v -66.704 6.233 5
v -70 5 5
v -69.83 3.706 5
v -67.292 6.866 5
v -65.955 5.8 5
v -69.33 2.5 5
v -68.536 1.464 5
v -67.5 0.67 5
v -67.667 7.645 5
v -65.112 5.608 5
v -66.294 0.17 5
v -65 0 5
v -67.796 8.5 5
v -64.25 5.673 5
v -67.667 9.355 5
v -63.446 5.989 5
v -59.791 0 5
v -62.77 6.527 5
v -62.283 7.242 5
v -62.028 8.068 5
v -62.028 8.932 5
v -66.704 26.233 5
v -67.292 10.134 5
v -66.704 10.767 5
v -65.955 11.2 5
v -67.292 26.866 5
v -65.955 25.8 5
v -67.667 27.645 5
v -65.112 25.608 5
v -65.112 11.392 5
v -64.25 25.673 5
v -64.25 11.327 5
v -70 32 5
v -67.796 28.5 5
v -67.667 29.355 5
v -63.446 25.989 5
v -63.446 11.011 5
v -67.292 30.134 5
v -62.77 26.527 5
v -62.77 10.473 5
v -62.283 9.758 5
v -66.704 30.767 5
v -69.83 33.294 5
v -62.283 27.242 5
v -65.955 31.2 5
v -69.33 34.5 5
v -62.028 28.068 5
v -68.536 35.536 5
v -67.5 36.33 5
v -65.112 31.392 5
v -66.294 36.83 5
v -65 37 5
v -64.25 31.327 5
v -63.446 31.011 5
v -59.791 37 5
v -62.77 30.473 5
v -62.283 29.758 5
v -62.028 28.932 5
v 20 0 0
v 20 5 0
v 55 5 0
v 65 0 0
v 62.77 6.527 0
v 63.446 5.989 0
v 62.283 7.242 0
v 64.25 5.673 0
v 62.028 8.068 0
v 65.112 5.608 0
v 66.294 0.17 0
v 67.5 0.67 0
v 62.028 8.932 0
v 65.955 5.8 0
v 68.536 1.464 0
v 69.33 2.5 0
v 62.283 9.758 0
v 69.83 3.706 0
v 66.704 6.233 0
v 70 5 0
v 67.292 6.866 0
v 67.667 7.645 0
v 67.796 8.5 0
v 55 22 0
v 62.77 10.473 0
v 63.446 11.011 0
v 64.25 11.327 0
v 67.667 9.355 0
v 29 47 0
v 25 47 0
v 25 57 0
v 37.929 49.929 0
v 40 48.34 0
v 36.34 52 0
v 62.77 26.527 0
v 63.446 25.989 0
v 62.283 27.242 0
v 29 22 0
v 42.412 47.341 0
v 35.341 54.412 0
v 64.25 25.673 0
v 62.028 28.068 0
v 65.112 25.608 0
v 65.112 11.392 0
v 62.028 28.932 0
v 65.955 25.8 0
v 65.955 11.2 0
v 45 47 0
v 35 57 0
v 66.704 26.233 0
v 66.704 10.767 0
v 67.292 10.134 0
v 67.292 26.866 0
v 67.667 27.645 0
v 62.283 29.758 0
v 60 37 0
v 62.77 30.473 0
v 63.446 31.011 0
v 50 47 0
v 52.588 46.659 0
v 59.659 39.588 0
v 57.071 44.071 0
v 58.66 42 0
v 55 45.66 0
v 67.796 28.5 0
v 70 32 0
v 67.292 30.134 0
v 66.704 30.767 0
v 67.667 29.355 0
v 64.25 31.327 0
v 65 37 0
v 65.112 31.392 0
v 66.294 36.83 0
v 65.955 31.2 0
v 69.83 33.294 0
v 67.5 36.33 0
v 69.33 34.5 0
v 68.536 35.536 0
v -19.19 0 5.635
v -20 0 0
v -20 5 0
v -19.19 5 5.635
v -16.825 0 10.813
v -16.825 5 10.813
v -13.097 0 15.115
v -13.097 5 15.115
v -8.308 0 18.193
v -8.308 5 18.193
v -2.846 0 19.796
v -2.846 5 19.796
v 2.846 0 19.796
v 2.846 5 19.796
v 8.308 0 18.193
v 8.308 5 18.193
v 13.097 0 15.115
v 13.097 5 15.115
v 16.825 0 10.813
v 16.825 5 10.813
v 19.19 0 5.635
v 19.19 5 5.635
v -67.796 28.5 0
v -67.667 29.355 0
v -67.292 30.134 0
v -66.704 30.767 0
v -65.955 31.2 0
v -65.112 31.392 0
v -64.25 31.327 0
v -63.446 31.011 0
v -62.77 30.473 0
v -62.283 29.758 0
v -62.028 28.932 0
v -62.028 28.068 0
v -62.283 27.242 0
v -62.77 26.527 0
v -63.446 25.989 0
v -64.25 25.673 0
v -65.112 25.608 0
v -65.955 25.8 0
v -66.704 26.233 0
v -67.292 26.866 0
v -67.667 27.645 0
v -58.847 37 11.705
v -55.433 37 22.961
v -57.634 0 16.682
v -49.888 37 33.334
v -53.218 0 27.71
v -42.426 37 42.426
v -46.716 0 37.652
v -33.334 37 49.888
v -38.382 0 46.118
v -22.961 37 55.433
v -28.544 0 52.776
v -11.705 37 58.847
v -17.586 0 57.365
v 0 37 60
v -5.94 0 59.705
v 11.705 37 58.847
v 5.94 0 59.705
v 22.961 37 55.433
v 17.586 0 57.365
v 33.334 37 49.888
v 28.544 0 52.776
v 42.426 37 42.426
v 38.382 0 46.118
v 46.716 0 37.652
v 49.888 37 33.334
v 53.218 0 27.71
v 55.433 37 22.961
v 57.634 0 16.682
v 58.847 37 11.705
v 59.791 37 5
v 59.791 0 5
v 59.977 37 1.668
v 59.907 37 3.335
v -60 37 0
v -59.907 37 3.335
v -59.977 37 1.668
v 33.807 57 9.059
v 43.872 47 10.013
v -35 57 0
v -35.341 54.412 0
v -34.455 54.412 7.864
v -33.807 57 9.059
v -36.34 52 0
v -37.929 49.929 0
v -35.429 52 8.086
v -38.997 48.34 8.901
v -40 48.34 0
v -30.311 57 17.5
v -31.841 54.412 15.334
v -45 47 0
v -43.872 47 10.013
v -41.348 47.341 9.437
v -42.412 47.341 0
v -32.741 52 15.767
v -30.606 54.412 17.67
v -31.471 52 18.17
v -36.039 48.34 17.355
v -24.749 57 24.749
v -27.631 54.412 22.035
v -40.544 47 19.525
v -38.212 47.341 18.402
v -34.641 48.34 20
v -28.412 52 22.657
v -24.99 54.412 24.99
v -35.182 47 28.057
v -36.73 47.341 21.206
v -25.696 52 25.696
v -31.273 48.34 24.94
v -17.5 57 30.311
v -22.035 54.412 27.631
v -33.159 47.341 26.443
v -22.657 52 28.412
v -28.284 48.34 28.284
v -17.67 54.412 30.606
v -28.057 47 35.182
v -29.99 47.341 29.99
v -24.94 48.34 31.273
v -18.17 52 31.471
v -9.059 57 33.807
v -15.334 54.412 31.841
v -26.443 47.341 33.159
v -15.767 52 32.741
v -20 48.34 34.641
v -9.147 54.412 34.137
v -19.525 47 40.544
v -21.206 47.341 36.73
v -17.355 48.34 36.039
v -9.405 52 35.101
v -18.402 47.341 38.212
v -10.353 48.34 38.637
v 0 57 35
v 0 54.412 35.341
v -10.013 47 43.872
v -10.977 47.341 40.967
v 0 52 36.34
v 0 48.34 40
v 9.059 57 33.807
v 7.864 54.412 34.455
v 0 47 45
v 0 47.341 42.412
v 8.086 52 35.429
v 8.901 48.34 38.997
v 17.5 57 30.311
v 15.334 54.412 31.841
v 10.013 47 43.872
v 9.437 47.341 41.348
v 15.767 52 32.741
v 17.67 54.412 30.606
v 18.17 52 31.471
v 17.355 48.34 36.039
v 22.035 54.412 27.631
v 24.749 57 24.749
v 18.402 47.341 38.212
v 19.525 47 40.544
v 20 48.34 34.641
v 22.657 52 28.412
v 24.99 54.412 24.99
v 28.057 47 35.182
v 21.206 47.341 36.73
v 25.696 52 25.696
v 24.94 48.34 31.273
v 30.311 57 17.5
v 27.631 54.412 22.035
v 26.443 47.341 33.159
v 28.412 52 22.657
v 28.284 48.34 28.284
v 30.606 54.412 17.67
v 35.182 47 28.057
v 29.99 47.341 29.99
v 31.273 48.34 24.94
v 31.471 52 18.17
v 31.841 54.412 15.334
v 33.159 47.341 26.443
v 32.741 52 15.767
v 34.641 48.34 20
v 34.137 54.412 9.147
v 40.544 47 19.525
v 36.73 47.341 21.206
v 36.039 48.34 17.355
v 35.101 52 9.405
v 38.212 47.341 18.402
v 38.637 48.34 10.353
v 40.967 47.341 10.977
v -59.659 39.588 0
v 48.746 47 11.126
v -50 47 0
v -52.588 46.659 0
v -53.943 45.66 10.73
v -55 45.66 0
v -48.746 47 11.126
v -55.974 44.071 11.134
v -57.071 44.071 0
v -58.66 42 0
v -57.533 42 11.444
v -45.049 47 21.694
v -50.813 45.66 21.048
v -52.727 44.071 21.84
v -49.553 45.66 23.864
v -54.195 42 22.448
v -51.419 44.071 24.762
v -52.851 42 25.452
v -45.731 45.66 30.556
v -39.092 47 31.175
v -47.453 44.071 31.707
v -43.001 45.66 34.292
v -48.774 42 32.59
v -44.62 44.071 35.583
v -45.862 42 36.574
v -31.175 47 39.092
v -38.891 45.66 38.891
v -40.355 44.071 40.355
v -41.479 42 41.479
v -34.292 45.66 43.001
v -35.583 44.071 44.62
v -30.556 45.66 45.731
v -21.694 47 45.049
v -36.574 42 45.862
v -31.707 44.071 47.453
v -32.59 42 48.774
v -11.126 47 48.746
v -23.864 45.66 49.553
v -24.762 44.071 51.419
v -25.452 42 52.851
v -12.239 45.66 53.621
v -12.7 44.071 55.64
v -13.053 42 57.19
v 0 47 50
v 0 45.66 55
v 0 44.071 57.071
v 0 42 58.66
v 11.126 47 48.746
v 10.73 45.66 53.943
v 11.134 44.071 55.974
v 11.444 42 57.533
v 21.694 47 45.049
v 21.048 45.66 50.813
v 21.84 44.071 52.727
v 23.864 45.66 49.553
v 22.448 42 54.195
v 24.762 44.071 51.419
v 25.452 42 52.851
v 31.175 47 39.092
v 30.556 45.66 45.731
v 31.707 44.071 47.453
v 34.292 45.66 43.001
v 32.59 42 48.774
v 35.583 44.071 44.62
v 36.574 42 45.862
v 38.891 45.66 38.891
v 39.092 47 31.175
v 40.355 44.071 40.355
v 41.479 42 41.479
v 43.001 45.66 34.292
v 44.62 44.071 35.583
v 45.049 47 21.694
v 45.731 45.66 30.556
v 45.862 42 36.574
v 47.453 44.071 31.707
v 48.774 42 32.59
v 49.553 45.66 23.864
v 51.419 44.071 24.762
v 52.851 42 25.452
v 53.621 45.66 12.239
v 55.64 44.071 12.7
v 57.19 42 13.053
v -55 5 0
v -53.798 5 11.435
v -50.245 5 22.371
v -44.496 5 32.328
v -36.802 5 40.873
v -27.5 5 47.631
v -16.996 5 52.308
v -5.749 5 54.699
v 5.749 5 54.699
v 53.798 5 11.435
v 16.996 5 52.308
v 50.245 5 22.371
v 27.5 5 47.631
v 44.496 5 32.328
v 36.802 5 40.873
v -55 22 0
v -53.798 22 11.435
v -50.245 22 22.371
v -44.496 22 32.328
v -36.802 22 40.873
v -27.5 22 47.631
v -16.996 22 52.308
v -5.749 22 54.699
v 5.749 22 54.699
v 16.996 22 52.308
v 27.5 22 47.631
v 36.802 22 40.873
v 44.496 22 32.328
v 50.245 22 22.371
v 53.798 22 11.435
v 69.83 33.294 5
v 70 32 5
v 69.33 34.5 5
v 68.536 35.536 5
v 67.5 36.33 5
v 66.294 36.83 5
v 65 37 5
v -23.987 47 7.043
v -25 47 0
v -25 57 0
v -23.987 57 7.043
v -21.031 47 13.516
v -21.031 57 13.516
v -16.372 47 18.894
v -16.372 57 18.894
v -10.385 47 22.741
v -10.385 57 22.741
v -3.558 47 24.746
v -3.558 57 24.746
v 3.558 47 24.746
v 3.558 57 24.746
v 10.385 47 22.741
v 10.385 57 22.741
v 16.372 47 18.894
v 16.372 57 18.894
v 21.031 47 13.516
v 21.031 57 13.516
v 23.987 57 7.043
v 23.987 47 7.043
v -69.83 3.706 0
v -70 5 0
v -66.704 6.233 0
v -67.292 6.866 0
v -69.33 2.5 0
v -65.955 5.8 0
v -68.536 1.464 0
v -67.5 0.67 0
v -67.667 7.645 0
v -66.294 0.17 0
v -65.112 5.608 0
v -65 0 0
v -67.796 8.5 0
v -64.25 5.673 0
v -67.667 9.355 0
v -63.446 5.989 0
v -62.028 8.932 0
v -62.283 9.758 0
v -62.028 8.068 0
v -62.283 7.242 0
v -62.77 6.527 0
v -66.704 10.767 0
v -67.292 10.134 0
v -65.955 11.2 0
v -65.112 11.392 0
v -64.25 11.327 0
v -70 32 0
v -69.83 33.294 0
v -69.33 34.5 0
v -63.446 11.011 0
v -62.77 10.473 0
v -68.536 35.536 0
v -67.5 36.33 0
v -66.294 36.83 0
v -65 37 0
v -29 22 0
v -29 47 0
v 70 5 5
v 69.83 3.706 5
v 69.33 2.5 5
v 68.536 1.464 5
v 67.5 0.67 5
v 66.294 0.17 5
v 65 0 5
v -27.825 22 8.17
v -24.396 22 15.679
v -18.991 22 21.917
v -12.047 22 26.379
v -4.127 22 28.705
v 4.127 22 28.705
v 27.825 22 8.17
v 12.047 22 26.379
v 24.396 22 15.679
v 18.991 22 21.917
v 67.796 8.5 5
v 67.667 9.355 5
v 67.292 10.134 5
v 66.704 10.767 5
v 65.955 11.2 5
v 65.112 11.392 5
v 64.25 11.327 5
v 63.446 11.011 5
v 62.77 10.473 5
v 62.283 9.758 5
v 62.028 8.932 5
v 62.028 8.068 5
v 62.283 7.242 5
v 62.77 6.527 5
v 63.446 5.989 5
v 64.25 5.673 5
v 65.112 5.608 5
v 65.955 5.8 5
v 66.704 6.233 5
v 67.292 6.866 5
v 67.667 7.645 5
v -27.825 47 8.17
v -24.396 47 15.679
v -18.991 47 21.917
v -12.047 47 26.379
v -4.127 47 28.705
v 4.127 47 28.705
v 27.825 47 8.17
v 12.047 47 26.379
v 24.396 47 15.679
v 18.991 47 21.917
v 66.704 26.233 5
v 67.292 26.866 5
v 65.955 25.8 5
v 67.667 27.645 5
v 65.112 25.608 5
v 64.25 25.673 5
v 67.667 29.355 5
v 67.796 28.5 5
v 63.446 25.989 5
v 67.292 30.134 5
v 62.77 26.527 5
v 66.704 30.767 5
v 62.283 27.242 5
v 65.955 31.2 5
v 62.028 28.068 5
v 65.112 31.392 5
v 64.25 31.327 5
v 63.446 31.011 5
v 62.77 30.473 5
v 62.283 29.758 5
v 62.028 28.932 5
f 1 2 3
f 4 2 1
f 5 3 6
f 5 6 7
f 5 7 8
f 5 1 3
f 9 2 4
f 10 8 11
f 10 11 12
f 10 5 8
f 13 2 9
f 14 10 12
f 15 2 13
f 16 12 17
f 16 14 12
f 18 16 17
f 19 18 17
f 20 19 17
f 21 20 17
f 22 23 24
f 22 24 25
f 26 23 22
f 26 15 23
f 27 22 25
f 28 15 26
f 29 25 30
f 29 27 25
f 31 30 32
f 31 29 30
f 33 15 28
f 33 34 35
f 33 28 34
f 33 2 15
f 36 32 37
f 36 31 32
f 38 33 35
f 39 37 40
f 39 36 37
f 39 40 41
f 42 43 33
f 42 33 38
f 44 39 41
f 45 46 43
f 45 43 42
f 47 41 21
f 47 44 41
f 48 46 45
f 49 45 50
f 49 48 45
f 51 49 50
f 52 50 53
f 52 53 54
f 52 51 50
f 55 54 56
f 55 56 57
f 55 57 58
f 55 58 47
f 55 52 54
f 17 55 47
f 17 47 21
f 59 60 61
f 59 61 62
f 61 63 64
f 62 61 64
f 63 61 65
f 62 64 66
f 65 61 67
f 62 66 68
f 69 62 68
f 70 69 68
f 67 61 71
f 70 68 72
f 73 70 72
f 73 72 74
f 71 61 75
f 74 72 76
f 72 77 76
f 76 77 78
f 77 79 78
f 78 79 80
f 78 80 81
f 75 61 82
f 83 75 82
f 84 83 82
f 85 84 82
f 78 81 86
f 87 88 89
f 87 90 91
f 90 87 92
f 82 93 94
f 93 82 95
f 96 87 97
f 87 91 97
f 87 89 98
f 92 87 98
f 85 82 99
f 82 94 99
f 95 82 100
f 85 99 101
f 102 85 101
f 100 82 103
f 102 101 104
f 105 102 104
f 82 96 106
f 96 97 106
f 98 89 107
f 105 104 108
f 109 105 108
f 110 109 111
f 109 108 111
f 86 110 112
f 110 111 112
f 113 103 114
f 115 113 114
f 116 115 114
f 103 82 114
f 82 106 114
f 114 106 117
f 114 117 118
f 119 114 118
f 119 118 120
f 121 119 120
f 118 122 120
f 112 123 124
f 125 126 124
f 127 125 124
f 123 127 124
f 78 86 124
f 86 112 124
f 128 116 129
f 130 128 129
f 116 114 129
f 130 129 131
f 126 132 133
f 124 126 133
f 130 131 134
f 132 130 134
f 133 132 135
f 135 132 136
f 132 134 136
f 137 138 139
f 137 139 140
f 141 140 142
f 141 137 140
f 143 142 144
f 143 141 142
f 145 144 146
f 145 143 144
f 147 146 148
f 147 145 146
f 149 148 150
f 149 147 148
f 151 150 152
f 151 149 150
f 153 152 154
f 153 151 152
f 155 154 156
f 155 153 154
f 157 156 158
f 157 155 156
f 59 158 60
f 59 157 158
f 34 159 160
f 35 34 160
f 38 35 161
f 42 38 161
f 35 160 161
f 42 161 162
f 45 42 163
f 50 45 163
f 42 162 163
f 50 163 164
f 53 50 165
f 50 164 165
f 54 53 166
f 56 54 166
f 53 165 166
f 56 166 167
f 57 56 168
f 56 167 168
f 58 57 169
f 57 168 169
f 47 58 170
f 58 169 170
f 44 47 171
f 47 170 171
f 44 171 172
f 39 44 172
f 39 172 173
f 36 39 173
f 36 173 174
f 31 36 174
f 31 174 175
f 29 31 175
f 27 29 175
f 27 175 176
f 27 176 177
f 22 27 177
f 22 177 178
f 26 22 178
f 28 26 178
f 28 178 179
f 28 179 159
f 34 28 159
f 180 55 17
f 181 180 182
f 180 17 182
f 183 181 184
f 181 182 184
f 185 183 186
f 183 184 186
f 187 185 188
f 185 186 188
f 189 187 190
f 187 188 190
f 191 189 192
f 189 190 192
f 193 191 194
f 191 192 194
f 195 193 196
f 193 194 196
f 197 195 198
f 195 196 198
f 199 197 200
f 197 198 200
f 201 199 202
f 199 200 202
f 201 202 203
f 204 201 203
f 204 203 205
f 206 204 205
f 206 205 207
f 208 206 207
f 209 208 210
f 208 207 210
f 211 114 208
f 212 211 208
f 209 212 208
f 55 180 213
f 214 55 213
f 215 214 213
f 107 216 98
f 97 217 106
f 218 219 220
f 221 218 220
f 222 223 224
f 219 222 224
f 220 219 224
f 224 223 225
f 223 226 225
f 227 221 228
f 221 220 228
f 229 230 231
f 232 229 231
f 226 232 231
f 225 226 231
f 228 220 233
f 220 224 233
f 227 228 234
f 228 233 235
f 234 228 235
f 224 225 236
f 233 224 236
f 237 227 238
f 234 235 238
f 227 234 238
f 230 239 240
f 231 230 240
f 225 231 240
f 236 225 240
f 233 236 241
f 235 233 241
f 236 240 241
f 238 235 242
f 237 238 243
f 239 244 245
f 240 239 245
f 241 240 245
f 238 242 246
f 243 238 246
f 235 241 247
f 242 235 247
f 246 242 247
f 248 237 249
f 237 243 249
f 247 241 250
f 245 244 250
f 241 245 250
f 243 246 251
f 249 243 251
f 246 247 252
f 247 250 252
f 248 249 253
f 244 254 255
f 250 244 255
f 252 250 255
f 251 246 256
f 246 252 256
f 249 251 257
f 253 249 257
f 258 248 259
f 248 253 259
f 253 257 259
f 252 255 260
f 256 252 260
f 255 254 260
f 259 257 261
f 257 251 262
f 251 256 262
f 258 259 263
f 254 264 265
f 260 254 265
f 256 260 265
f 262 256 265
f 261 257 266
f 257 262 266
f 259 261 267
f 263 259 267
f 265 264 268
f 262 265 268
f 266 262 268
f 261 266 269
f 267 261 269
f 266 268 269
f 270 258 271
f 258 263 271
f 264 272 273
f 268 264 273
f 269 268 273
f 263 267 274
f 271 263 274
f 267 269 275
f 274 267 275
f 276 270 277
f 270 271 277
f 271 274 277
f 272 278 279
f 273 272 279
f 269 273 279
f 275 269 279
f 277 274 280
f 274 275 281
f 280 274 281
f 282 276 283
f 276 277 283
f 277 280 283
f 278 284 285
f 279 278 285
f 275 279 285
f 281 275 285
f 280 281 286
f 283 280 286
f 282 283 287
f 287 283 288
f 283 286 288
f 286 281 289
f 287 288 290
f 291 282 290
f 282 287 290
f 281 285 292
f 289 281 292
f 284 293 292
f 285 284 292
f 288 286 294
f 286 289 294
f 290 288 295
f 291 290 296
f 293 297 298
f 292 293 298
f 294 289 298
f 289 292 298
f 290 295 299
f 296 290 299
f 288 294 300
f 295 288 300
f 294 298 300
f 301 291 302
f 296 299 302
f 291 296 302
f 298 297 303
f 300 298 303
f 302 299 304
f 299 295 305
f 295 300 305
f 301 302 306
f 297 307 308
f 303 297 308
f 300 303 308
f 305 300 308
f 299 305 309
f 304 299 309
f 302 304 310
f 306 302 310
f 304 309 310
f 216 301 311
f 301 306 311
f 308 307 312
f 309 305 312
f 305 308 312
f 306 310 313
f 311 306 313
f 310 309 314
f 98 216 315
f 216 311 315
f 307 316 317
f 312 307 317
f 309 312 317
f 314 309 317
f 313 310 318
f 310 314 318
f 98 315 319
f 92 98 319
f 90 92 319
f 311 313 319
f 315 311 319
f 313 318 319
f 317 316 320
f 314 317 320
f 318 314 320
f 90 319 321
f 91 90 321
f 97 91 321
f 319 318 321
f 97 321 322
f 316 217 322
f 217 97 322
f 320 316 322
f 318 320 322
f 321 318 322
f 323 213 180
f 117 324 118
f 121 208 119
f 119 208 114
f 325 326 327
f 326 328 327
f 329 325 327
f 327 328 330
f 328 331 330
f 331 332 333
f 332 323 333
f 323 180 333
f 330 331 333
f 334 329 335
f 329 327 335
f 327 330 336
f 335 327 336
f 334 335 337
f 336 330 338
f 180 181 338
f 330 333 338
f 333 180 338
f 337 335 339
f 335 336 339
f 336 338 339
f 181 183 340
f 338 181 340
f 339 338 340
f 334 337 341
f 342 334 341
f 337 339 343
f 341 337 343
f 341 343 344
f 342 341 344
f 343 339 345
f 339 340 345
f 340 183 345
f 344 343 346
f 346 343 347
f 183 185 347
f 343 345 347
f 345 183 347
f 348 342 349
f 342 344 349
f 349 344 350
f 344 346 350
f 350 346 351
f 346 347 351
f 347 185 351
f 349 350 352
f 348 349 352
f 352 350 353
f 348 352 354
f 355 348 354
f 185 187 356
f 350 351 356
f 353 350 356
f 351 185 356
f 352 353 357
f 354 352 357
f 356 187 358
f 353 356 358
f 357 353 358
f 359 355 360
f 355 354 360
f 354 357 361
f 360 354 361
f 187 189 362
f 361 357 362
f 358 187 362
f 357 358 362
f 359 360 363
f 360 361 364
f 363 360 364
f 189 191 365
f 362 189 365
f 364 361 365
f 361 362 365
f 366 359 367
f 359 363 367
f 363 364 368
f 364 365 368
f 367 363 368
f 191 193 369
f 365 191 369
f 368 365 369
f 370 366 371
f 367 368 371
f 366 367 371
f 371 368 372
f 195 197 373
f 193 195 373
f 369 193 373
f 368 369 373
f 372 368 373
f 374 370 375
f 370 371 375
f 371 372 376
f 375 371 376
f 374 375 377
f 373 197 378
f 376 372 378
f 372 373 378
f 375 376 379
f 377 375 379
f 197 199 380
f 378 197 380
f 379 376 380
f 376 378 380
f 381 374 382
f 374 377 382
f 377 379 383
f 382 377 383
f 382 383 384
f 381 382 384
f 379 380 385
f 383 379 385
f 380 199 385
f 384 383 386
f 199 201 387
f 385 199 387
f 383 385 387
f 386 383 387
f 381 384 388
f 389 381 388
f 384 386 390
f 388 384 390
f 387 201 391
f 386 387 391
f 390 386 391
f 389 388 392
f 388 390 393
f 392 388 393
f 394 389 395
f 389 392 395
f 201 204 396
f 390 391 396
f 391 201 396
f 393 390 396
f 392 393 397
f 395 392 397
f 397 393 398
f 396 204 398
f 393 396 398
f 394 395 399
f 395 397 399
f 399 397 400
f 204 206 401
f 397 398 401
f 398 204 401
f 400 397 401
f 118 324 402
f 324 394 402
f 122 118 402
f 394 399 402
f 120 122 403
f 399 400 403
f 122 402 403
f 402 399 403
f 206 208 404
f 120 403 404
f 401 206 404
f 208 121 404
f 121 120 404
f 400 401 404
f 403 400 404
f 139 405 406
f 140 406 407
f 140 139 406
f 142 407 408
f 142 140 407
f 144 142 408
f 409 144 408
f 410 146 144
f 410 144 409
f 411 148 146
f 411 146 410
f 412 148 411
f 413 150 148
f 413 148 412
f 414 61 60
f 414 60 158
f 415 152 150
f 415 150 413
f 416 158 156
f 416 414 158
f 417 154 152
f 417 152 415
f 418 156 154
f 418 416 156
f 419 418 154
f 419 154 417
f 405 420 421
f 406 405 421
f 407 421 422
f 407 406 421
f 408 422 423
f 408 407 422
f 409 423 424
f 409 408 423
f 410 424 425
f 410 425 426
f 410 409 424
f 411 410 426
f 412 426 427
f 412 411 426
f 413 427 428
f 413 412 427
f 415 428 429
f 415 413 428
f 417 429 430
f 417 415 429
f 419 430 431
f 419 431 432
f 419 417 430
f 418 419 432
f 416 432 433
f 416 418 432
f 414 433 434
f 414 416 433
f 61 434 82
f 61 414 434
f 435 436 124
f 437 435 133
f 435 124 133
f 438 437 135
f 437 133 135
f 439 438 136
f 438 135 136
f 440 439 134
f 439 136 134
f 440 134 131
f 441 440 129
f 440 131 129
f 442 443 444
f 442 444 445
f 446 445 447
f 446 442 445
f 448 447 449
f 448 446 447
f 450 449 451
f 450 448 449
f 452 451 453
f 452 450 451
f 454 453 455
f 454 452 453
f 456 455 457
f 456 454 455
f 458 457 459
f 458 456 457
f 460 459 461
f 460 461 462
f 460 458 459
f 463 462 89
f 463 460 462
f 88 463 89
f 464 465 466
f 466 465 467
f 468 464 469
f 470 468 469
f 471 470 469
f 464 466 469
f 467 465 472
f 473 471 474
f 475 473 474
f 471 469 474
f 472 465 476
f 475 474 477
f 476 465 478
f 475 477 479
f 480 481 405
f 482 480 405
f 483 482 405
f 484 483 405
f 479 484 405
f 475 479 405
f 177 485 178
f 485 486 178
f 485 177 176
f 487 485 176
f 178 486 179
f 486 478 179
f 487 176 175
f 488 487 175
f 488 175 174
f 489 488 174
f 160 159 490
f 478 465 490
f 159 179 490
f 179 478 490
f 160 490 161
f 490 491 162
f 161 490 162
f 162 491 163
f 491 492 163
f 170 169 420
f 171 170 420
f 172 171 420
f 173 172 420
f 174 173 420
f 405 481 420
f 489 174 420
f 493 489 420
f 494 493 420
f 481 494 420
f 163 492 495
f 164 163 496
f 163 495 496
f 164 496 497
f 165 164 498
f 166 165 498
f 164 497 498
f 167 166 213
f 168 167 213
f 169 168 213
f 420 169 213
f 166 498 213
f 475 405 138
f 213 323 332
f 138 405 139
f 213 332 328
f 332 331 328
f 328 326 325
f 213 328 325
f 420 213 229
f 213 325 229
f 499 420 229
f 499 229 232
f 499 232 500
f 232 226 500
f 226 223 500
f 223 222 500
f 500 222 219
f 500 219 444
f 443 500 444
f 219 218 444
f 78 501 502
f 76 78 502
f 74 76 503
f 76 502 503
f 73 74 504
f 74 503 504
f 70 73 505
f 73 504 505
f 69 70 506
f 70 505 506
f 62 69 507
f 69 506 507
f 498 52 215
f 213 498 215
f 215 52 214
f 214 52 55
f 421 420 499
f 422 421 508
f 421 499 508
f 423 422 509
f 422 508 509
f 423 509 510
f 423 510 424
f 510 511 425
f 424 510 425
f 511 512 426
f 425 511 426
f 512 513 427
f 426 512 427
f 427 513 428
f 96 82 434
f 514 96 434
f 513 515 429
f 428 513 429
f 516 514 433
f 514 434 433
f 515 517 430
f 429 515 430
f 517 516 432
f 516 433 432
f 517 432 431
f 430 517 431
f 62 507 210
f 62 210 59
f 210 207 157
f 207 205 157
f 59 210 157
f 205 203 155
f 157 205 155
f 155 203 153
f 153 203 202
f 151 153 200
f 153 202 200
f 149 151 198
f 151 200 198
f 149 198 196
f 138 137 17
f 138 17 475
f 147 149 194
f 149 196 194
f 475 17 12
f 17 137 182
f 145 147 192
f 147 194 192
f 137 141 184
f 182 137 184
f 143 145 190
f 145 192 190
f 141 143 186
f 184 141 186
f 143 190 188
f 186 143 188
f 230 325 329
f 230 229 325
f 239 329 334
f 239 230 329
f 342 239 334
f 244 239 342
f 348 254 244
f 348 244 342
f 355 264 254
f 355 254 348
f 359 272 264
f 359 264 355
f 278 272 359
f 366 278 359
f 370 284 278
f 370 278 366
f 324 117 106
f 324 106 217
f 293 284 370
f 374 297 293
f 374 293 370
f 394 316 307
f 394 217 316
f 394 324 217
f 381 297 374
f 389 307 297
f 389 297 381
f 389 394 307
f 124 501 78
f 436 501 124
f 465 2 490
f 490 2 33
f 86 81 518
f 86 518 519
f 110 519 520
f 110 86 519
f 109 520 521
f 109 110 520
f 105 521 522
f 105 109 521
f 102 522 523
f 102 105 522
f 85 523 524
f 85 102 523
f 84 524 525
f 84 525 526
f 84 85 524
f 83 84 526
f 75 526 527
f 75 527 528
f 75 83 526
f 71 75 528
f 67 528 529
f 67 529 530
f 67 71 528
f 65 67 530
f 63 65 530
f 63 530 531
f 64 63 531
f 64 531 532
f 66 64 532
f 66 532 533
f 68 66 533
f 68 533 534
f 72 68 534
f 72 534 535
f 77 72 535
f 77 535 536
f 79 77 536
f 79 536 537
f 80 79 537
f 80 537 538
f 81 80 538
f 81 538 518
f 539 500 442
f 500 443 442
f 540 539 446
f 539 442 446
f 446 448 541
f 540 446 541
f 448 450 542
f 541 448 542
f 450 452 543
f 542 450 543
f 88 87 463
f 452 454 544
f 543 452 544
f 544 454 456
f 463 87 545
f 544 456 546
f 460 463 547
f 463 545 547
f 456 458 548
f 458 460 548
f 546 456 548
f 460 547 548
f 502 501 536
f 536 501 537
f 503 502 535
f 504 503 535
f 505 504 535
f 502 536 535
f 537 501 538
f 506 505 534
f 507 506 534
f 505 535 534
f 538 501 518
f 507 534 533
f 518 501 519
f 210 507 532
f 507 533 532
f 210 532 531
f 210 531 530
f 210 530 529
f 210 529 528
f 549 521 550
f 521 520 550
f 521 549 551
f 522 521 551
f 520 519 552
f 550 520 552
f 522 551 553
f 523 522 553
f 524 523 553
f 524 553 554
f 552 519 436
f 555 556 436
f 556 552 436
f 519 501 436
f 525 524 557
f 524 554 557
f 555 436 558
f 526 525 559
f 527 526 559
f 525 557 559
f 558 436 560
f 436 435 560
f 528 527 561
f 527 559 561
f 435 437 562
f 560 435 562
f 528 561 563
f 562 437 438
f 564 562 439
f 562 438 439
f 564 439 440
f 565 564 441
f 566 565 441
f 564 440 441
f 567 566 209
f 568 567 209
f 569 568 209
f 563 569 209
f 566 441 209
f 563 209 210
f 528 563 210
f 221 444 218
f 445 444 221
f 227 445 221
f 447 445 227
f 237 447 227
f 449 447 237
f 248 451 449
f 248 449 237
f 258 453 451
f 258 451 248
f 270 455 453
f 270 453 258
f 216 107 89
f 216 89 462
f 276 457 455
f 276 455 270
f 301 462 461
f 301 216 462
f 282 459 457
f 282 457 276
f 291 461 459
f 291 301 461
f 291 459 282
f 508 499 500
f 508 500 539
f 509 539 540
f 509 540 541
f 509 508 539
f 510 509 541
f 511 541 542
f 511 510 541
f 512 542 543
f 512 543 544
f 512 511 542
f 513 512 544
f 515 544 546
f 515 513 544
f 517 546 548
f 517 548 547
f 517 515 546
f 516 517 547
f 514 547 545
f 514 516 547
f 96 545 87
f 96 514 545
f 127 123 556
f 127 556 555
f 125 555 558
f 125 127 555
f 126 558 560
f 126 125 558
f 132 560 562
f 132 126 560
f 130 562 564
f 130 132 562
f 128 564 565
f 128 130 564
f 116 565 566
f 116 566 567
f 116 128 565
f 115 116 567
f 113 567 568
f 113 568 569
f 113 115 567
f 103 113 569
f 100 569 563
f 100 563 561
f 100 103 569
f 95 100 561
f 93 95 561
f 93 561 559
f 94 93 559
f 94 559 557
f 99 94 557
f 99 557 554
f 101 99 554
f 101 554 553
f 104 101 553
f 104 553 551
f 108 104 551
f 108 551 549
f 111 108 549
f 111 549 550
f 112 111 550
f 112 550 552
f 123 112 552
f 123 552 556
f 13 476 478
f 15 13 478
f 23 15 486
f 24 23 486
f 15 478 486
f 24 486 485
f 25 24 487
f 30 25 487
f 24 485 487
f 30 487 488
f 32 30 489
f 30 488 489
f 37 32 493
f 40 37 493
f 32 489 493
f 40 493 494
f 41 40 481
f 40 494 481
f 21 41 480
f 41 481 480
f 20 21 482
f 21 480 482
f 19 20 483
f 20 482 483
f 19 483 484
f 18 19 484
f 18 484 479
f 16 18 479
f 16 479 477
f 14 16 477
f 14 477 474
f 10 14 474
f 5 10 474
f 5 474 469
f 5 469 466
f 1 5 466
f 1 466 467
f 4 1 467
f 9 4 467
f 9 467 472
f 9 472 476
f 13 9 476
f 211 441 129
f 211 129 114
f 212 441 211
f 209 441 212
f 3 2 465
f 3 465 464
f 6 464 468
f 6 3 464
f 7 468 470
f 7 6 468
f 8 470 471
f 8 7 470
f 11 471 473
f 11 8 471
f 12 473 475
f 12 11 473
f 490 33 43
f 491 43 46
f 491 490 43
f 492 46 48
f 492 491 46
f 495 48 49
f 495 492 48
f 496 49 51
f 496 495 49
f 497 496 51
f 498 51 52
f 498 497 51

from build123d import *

# Parameters (mm, degrees)
SKETCH1_R                = 25
SKETCH1_R_2              = 20
BOSS_EXTRUDE1_DEPTH      = 5
BOSS_EXTRUDE2_START      = -5
SKETCH2_R                = 60
SKETCH2_R_2              = 20
BOSS_EXTRUDE2_DEPTH      = 5
SKETCH3_R                = 60
SKETCH3_R_2              = 55
BOSS_EXTRUDE3_DEPTH      = 17
SKETCH4_R                = 60
SKETCH4_R_2              = 29
BOSS_EXTRUDE4_DEPTH      = 25
SKETCH5_R                = 35
SKETCH5_R_2              = 25
BOSS_EXTRUDE5_DEPTH      = 10
FILLET2_R                = 10
SKETCH6_W                = 10
SKETCH6_H                = 37
BOSS_EXTRUDE7_DEPTH      = 5
BOSS_EXTRUDE8_REACH      = 156.107
BOSS_EXTRUDE8_END_RADIUS = 60
SKETCH7_W                = 10
SKETCH7_H                = 37
M5_CLEARANCE_HOLE1_D     = 5.8
FILLET3_R                = 5


with BuildPart() as part:
    # Sketch1 → Boss-Extrude1 (new body)
    with BuildSketch(Plane(origin=(0, 0, 0), x_dir=(1, 0, 0), z_dir=(0, 1, 0))):
        with Locations(Location((0, 0, 0), (0, 0, 270))):
            Circle(SKETCH1_R)
        with Locations(Location((0, 0, 0), (0, 0, 270))):
            Circle(SKETCH1_R_2, mode=Mode.SUBTRACT)
    extrude(amount=BOSS_EXTRUDE1_DEPTH)

    # Sketch2 → Boss-Extrude2 (add)
    with BuildSketch(Plane(origin=(0, 5, 0), x_dir=(1, 0, 0), z_dir=(0, 1, 0)).offset(BOSS_EXTRUDE2_START)):
        with Locations(Location((0, 0, 0), (0, 0, 270))):
            Circle(SKETCH2_R)
        with Locations(Location((0, 0, 0), (0, 0, 270))):
            Circle(SKETCH2_R_2, mode=Mode.SUBTRACT)
    extrude(amount=BOSS_EXTRUDE2_DEPTH)

    # Sketch3 → Boss-Extrude3 (add)
    with BuildSketch(Plane(origin=(0, 5, 0), x_dir=(1, 0, 0), z_dir=(0, 1, 0))):
        with Locations(Location((0, 0, 0), (0, 0, 270))):
            Circle(SKETCH3_R)
        with Locations(Location((0, 0, 0), (0, 0, 270))):
            Circle(SKETCH3_R_2, mode=Mode.SUBTRACT)
    extrude(amount=BOSS_EXTRUDE3_DEPTH)

    # Sketch4 → Boss-Extrude4 (add)
    with BuildSketch(Plane(origin=(0, 22, 0), x_dir=(1, 0, 0), z_dir=(0, 1, 0))):
        with Locations(Location((0, 0, 0), (0, 0, 270))):
            Circle(SKETCH4_R)
        with Locations(Location((0, 0, 0), (0, 0, 270))):
            Circle(SKETCH4_R_2, mode=Mode.SUBTRACT)
    extrude(amount=BOSS_EXTRUDE4_DEPTH)

    # Sketch5 → Boss-Extrude5 (add)
    with BuildSketch(Plane(origin=(0, 47, 0), x_dir=(1, 0, 0), z_dir=(0, 1, 0))):
        with Locations(Location((0, 0, 0), (0, 0, 270))):
            Circle(SKETCH5_R)
        with Locations(Location((0, 0, 0), (0, 0, 270))):
            Circle(SKETCH5_R_2, mode=Mode.SUBTRACT)
    extrude(amount=BOSS_EXTRUDE5_DEPTH)

    # Fillet2
    fillet2_edges = [part.edges().sort_by_distance(p)[0] for p in [
        (0, 47, -60),
        (0, 47, -35),
    ]]
    fillet(fillet2_edges, radius=FILLET2_R - 0.0001)  # a hair under: the kernel refuses the full size



with BuildPart() as body_2:
    # Sketch6 → Boss-Extrude7 (new, symmetric)
    with BuildSketch(Plane.XY):
        with Locations((-65, 18.5)):
            Rectangle(SKETCH6_W, SKETCH6_H)
    extrude(amount=BOSS_EXTRUDE7_DEPTH, both=True)


with BuildPart() as part_1:
    add(part.part)

    add(body_2.part)  # Boss-Extrude8 merges body 2
    # Boss-Extrude8: up to this cylinder (the profile starts outside it)
    boss_extrude8_end = Plane(origin=(0, 18.5, 0), z_dir=(0, 1, 0)) * Cylinder(BOSS_EXTRUDE8_END_RADIUS, 433.214, mode=Mode.PRIVATE)
    # Sketch7 → Boss-Extrude8 (add, up to the surface)
    with BuildSketch(Plane.ZY.offset(70), mode=Mode.PRIVATE) as boss_extrude8_sk1:
        with Locations((0, 18.5)):
            Rectangle(SKETCH7_W, SKETCH7_H)
    boss_extrude8_tool1 = extrude(boss_extrude8_sk1.sketch, amount=-BOSS_EXTRUDE8_REACH, mode=Mode.PRIVATE) - boss_extrude8_end
    add(boss_extrude8_tool1.solids().sort_by_distance((-70, 18.5, 0))[0])

    # M5 Clearance Hole1 (through all)
    with Locations(Plane.XY.offset(5)):
        with Locations((-64.895651858, 8.5), (-64.895651858, 28.5)):
            Hole(M5_CLEARANCE_HOLE1_D / 2)

    # Fillet3
    fillet3_edges = [part_1.edges().sort_by_distance(p)[0] for p in [
        (-70, 37, 0),
        (-70, 0, 0),
    ]]
    fillet(fillet3_edges, radius=FILLET3_R)

    # Mirror1: part across plane


with BuildPart() as part_2:
    add(part_1.part)
    add(part_1.part.mirror(Plane(origin=(0, 0, 0), x_dir=(0, 0, 1), z_dir=(1, 0, 0))))


with BuildPart() as body_2_2:
    # Split1: the piece on the far side of the plane
    add(part_2.part)
    split(bisect_by=Plane.XY, keep=Keep.BOTTOM)


with BuildPart() as part_3:
    add(part_2.part)

    # Split1
    split(bisect_by=Plane.XY, keep=Keep.TOP)


solid = part_3.part
